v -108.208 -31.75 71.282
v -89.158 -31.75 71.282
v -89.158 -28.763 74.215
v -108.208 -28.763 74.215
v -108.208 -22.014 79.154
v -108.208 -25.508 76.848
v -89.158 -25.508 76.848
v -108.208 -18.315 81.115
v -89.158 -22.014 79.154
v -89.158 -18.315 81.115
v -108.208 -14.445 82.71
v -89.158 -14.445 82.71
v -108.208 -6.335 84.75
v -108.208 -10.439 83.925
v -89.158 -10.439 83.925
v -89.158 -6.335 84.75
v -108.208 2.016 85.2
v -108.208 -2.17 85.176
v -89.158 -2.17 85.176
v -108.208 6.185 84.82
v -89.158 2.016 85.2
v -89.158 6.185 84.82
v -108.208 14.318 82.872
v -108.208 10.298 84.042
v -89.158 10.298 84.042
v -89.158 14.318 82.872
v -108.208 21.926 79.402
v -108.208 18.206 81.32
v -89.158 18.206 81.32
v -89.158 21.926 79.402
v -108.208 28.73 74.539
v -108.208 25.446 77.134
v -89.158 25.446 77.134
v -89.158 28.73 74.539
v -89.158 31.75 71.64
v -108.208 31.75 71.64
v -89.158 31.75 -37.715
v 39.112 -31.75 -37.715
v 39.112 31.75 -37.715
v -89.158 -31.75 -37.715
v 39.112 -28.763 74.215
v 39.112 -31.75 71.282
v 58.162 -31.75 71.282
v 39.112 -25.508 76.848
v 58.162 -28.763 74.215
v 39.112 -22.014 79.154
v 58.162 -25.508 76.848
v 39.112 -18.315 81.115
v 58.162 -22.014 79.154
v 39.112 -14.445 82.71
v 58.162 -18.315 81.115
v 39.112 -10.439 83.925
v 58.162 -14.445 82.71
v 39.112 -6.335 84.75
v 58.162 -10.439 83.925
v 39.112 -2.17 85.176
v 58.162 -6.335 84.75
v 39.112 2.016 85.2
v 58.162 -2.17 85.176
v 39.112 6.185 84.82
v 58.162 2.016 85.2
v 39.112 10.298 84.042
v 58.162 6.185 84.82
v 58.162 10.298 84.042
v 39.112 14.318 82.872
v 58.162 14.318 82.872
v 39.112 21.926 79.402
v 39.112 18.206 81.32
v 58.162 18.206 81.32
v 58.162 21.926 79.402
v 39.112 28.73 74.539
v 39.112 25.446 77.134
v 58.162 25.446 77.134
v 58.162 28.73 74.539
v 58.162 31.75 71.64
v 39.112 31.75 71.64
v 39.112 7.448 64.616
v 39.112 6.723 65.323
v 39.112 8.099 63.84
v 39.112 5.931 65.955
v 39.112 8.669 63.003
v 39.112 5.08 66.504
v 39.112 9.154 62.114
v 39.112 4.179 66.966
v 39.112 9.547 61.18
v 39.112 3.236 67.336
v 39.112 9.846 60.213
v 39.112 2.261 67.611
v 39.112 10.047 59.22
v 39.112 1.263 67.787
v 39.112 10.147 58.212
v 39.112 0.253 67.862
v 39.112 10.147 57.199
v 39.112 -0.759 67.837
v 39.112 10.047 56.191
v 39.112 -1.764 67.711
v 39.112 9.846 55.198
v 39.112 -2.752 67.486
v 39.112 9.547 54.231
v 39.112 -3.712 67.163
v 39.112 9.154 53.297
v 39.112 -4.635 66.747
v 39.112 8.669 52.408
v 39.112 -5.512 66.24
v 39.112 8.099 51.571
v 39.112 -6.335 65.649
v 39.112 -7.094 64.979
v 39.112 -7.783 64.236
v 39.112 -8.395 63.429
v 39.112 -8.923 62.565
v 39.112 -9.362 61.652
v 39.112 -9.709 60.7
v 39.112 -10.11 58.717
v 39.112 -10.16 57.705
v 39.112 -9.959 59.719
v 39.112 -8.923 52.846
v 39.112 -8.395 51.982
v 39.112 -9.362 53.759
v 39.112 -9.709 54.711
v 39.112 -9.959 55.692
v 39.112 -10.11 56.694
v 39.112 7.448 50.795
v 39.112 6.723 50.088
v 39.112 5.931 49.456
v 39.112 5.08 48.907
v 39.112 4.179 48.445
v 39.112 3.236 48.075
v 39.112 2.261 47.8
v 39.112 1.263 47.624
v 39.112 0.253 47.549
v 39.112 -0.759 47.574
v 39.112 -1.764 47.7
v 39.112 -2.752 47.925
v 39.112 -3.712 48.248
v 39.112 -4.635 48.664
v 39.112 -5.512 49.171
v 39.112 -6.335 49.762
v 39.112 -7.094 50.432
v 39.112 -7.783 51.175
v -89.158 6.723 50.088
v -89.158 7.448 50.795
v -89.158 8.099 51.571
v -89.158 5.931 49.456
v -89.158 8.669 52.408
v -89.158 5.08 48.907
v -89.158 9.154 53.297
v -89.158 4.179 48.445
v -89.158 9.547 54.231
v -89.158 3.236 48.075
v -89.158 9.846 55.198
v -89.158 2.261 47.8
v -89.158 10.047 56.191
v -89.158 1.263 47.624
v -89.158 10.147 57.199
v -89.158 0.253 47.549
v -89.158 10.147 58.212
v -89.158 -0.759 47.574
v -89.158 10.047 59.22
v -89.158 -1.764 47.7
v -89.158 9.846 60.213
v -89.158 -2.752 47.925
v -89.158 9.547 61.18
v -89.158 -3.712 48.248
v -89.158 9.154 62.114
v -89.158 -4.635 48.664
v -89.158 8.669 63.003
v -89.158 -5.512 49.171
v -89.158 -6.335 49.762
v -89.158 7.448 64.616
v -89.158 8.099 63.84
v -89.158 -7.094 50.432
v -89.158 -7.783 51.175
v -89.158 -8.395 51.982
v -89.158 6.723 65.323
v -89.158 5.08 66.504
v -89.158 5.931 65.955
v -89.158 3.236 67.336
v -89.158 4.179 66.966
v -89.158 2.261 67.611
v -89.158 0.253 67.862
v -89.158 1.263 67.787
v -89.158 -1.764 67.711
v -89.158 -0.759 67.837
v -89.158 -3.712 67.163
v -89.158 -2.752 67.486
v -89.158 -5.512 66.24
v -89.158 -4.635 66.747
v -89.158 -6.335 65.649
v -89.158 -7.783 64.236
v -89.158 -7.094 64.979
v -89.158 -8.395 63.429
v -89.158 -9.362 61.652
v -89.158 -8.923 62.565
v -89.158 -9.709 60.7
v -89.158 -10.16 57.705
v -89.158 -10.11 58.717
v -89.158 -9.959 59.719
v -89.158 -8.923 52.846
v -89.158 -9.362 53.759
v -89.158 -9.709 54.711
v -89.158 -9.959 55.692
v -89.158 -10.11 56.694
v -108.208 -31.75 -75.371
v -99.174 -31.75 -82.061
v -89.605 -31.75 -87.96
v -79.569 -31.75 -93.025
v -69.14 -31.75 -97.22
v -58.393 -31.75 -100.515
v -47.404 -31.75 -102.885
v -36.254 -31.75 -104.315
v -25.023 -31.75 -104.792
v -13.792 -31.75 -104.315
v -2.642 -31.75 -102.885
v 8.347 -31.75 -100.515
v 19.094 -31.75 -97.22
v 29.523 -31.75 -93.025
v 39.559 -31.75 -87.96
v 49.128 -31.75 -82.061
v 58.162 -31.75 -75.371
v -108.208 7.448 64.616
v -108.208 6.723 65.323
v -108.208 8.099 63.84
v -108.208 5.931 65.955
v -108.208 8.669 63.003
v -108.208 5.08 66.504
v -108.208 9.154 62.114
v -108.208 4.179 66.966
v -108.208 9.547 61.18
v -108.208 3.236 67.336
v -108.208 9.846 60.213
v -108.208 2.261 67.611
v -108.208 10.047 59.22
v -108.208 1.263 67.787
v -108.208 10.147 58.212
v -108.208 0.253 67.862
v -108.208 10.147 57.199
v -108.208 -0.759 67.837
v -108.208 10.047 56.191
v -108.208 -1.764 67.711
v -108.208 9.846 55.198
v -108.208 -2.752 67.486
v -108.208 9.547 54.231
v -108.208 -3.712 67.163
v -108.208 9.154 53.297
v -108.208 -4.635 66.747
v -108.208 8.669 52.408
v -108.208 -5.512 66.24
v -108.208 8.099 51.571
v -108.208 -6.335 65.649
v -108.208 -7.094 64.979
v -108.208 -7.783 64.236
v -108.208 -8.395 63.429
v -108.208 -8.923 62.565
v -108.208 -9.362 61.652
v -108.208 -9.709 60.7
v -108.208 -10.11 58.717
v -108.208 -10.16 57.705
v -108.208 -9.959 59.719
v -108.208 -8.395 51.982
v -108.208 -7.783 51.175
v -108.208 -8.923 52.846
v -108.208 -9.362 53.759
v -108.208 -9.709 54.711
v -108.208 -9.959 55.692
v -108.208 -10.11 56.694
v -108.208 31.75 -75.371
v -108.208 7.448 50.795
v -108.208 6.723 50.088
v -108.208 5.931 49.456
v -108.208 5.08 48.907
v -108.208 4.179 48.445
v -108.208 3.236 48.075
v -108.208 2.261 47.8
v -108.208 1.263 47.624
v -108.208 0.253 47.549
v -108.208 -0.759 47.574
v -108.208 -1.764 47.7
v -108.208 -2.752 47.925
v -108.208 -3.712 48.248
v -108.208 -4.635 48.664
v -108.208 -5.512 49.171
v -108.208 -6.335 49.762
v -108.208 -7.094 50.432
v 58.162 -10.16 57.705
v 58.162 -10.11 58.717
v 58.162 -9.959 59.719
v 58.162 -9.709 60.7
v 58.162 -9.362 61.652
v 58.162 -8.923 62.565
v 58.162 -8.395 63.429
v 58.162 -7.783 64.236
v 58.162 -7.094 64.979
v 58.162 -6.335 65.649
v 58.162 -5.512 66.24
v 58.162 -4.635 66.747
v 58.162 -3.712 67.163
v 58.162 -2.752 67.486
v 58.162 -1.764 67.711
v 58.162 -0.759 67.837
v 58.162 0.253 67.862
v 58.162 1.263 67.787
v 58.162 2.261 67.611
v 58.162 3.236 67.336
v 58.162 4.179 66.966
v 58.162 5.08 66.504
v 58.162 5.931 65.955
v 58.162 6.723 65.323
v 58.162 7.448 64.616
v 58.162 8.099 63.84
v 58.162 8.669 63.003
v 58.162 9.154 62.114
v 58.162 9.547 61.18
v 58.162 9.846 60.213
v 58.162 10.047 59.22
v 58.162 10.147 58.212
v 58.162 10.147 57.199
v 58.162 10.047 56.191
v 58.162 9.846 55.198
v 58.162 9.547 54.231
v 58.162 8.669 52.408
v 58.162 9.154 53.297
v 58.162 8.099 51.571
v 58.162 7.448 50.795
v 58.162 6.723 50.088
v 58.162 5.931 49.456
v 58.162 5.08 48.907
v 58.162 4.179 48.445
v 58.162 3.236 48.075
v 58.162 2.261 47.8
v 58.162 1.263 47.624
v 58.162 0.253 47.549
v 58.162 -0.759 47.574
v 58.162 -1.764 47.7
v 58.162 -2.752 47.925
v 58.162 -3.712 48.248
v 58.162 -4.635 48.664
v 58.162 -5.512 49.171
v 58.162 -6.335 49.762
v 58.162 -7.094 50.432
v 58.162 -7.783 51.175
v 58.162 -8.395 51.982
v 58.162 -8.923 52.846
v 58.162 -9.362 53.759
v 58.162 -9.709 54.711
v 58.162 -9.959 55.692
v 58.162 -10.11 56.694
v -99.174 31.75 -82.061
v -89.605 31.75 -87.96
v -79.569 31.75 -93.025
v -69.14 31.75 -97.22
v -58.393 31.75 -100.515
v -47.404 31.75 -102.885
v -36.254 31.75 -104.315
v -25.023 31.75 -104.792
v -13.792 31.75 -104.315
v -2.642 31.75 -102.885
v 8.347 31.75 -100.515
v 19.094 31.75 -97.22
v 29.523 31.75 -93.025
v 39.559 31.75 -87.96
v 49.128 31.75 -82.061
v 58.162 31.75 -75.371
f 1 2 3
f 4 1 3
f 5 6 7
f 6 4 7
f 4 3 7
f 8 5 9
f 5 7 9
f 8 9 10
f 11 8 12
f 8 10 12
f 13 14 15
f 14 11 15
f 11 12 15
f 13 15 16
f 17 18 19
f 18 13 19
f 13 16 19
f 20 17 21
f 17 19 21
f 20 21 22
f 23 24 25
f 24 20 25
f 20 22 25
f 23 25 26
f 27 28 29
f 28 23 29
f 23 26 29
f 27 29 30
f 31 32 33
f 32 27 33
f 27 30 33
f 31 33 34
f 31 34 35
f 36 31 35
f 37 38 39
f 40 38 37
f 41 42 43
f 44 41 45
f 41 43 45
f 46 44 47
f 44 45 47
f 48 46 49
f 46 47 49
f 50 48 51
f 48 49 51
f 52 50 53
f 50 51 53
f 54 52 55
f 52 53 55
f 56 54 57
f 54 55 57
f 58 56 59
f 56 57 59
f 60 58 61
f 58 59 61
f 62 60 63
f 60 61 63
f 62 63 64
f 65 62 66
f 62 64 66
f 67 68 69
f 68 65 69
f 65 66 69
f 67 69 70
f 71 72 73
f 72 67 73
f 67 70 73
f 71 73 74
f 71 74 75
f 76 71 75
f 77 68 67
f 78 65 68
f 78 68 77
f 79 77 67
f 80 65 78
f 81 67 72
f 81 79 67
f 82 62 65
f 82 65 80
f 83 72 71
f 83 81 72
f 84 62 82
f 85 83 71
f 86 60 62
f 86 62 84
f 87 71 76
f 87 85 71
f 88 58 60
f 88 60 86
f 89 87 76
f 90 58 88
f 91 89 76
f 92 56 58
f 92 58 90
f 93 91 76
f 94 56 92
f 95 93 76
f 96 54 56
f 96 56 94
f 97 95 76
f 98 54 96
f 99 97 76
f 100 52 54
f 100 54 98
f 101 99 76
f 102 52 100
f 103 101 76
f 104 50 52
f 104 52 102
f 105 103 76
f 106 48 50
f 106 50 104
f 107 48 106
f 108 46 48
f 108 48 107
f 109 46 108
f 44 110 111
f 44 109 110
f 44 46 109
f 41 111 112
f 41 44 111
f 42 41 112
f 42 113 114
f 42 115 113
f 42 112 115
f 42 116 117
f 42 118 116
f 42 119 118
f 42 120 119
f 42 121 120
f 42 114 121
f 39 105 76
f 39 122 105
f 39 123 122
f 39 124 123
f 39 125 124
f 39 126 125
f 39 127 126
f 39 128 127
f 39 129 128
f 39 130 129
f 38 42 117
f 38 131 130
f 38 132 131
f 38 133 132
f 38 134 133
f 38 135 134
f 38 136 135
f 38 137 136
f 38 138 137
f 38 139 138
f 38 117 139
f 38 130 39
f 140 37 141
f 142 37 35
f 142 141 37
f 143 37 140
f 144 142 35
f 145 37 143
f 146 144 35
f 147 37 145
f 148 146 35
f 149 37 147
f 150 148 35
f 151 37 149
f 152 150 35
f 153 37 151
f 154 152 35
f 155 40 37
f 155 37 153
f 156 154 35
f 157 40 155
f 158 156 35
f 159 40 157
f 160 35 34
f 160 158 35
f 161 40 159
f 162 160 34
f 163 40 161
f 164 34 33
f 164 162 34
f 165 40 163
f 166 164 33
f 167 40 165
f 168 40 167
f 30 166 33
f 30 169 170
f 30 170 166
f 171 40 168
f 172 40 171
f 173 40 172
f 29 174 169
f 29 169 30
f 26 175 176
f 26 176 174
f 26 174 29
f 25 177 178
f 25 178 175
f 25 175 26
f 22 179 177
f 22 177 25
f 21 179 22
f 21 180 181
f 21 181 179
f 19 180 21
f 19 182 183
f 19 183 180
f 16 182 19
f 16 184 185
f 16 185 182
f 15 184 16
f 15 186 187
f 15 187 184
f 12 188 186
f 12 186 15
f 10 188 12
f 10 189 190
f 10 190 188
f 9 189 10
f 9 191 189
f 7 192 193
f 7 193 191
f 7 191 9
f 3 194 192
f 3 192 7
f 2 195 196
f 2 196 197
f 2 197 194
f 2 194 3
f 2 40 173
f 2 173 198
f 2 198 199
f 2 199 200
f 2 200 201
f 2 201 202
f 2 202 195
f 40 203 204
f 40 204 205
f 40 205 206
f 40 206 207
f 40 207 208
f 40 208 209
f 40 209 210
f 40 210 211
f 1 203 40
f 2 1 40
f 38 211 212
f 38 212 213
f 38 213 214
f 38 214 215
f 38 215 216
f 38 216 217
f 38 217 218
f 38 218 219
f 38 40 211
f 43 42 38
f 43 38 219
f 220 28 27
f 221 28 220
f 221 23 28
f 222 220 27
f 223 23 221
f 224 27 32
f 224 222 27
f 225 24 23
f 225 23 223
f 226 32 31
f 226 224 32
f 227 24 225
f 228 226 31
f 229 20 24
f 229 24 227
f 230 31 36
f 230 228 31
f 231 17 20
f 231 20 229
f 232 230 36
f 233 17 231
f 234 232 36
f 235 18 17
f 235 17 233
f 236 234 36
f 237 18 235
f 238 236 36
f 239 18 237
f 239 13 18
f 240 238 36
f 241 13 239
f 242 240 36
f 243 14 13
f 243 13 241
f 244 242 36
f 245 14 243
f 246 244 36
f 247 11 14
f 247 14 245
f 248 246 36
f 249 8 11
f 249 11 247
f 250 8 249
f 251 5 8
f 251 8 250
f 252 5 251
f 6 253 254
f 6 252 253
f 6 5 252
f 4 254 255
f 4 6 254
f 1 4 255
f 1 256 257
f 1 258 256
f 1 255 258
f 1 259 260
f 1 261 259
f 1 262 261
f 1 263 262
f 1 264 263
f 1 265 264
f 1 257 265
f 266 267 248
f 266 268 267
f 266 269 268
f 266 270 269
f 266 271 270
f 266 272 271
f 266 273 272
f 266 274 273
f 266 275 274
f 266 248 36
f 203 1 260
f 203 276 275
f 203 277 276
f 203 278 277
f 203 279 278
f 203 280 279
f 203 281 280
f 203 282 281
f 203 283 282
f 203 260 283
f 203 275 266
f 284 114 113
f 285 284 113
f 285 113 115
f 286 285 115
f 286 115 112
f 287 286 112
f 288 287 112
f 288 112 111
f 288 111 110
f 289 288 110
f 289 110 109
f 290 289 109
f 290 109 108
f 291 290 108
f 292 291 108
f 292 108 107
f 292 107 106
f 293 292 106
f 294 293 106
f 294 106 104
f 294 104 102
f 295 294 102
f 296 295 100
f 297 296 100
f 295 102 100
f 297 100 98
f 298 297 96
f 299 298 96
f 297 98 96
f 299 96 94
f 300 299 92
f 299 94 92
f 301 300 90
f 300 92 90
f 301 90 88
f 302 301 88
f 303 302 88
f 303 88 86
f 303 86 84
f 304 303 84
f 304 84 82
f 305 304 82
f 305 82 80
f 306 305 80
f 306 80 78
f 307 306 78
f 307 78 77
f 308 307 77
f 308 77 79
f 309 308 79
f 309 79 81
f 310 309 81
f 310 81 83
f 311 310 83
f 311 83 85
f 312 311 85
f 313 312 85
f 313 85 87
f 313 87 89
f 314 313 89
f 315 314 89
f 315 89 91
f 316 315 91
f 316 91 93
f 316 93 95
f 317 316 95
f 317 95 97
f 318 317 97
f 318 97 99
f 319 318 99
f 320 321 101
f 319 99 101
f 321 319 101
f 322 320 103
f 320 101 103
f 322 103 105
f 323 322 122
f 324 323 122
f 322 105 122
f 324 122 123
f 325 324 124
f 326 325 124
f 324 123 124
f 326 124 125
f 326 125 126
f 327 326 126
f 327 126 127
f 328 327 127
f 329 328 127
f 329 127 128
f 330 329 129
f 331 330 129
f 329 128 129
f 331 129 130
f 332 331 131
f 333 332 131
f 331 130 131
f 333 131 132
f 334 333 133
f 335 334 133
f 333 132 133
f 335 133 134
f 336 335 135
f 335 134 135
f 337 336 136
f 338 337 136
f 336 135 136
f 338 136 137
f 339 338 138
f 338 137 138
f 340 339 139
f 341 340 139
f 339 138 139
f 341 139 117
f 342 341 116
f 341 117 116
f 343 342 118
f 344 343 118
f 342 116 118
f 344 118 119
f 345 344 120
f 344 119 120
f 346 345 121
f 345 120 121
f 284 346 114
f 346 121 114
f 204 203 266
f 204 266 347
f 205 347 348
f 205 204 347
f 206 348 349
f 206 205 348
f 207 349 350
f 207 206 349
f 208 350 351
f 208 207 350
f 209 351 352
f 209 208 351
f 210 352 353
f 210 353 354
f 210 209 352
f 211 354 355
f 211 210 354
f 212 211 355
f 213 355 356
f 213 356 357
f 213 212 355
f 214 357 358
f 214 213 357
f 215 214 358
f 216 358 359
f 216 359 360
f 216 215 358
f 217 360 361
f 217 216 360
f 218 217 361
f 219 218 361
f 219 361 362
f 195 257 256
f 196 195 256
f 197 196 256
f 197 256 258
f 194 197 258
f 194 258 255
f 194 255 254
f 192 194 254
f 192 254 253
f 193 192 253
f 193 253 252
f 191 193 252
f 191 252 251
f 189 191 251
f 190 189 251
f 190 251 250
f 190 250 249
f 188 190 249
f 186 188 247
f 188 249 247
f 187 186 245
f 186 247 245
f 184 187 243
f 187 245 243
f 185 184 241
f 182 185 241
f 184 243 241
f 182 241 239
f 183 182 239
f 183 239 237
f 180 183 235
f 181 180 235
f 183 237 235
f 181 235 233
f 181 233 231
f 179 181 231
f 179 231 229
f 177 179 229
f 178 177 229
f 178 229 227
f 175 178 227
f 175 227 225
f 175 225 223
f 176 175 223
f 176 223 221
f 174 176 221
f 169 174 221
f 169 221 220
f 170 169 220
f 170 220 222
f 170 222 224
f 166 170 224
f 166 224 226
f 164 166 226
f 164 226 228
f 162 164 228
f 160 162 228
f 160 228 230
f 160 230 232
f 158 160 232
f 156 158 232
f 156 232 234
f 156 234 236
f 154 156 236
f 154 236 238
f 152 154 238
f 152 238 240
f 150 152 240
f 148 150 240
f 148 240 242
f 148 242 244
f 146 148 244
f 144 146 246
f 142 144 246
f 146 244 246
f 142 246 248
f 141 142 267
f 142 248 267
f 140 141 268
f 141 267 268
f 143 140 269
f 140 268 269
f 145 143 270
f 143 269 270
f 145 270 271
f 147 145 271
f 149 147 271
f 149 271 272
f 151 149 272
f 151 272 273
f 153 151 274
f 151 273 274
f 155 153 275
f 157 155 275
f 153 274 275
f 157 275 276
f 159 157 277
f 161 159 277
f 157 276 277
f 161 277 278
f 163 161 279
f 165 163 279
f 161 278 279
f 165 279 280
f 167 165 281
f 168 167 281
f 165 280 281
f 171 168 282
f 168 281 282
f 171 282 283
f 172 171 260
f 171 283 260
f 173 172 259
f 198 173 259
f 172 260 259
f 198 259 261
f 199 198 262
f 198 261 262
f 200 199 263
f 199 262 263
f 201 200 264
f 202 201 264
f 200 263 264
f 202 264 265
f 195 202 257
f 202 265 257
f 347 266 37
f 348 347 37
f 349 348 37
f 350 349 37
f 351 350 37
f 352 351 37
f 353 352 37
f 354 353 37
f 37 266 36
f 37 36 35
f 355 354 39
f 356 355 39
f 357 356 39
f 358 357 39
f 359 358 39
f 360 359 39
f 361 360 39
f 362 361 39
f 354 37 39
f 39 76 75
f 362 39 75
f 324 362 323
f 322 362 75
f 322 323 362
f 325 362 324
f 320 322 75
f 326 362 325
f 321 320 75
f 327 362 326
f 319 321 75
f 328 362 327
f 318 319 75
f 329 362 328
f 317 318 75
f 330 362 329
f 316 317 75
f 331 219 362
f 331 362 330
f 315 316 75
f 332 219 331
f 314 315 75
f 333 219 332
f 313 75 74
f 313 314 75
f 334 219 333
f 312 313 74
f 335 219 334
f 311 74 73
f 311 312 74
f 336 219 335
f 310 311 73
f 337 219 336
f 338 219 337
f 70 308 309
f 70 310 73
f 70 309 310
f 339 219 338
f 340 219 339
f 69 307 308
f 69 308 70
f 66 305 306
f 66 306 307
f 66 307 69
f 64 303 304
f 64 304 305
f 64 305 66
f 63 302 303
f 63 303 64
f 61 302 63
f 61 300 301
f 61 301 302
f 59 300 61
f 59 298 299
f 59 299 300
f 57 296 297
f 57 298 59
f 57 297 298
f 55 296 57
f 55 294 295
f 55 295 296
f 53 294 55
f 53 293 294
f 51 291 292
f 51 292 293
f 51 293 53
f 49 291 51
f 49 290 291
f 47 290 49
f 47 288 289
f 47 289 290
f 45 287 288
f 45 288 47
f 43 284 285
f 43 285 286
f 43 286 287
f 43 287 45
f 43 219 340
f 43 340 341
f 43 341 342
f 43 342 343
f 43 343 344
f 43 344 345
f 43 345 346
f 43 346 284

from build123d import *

# Parameters (mm, degrees)
F1_DEPTH = 31.75
F2_R     = 10.16
F3_DEPTH = 166.371
F5_DEPTH = 166.371


with BuildPart() as f1:
    # F0 (on Front) → F1 (new body, symmetric)
    with BuildSketch(Plane.XZ):
        Polygon((-108.20795, 89.455473), (-108.20795, -75.371138), (58.16205, -75.371138), (58.16205, 92.395943), (39.11205, 92.395943), (39.11205, -37.714908), (-89.15795, -37.714908), (-89.15795, 89.455473), align=None)
        with BuildLine():
            Line((58.16205, -75.371138), (-108.20795, -75.371138))
            ThreePointArc((-108.20795, -75.371138), (-25.02295, -104.792049), (58.16205, -75.371138))
        make_face()
    extrude(amount=F1_DEPTH, both=True)

    # F2 (on face) → F3 (cut, through all)
    with BuildSketch(Plane(origin=(-108.20795, 0, 0), x_dir=(0, -1, 0), z_dir=(-1, 0, 0))):
        with Locations((0, 57.705473)):
            Circle(F2_R)
    extrude(amount=-F3_DEPTH, mode=Mode.SUBTRACT)

    # F4 (on face) → F5 (cut, through all)
    with BuildSketch(Plane.YZ.offset(58.16205)):
        with BuildLine():
            ThreePointArc((-31.75, 71.282387), (-0.077504, 85.238302), (31.75, 71.639605))
            Line((31.75, 71.639605), (31.75, 92.395943))
            Line((31.75, 92.395943), (-31.75, 92.395943))
            Line((-31.75, 92.395943), (-31.75, 71.282387))
        make_face()
    extrude(amount=-F5_DEPTH, mode=Mode.SUBTRACT)


solid = f1.part
